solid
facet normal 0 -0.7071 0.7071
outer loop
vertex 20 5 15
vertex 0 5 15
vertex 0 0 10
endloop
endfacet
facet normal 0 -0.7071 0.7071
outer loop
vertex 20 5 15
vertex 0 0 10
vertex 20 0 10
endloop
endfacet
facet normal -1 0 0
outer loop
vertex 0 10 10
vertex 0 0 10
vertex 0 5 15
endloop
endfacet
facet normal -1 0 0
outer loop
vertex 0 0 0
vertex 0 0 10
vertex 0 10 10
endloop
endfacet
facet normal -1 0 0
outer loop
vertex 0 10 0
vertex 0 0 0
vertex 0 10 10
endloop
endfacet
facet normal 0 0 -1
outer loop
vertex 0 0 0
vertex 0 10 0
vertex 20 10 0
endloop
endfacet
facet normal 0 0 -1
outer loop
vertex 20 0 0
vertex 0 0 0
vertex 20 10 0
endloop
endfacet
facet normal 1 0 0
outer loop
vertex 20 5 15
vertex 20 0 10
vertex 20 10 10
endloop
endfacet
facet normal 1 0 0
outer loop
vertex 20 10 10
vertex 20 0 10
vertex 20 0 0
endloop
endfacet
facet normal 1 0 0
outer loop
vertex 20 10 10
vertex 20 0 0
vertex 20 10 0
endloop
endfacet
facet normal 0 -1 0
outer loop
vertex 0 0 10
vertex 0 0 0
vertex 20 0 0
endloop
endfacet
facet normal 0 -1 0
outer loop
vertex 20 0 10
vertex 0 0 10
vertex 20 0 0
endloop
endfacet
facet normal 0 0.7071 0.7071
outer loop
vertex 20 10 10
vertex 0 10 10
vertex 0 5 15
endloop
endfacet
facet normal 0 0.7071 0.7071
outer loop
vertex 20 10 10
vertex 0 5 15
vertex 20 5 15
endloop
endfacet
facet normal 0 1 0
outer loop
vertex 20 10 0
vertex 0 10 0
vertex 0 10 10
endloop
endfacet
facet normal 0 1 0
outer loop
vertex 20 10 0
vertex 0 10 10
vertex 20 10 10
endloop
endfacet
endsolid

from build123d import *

# Parameters (mm, degrees)
BOX001_W               = 20
BOX001_H               = 7.071068
BOX001_DEPTH           = 7.071068
BOX001_PLACEMENT_ANGLE = 45
BOX_W                  = 20
BOX_H                  = 10
BOX_DEPTH              = 10


with BuildPart() as cube001:
    # Box001 → Box001 (new body)
    with BuildSketch(Plane.XY):
        with Locations((10, 3.535534)):
            Rectangle(BOX001_W, BOX001_H)
    extrude(amount=BOX001_DEPTH)


with BuildPart() as cube001_1:
    # Box001 placement: moved
    add(cube001.part.moved(Location((0, 5, 5))).rotate(Axis((0, 5, 5), (1, 0, 0)), BOX001_PLACEMENT_ANGLE))


with BuildPart() as fusion:
    # Box → Box (new body)
    with BuildSketch(Plane.XY):
        with Locations((10, 5)):
            Rectangle(BOX_W, BOX_H)
    extrude(amount=BOX_DEPTH)

    # Fusion: union Cube001
    add(cube001_1.part)


solid = fusion.part
